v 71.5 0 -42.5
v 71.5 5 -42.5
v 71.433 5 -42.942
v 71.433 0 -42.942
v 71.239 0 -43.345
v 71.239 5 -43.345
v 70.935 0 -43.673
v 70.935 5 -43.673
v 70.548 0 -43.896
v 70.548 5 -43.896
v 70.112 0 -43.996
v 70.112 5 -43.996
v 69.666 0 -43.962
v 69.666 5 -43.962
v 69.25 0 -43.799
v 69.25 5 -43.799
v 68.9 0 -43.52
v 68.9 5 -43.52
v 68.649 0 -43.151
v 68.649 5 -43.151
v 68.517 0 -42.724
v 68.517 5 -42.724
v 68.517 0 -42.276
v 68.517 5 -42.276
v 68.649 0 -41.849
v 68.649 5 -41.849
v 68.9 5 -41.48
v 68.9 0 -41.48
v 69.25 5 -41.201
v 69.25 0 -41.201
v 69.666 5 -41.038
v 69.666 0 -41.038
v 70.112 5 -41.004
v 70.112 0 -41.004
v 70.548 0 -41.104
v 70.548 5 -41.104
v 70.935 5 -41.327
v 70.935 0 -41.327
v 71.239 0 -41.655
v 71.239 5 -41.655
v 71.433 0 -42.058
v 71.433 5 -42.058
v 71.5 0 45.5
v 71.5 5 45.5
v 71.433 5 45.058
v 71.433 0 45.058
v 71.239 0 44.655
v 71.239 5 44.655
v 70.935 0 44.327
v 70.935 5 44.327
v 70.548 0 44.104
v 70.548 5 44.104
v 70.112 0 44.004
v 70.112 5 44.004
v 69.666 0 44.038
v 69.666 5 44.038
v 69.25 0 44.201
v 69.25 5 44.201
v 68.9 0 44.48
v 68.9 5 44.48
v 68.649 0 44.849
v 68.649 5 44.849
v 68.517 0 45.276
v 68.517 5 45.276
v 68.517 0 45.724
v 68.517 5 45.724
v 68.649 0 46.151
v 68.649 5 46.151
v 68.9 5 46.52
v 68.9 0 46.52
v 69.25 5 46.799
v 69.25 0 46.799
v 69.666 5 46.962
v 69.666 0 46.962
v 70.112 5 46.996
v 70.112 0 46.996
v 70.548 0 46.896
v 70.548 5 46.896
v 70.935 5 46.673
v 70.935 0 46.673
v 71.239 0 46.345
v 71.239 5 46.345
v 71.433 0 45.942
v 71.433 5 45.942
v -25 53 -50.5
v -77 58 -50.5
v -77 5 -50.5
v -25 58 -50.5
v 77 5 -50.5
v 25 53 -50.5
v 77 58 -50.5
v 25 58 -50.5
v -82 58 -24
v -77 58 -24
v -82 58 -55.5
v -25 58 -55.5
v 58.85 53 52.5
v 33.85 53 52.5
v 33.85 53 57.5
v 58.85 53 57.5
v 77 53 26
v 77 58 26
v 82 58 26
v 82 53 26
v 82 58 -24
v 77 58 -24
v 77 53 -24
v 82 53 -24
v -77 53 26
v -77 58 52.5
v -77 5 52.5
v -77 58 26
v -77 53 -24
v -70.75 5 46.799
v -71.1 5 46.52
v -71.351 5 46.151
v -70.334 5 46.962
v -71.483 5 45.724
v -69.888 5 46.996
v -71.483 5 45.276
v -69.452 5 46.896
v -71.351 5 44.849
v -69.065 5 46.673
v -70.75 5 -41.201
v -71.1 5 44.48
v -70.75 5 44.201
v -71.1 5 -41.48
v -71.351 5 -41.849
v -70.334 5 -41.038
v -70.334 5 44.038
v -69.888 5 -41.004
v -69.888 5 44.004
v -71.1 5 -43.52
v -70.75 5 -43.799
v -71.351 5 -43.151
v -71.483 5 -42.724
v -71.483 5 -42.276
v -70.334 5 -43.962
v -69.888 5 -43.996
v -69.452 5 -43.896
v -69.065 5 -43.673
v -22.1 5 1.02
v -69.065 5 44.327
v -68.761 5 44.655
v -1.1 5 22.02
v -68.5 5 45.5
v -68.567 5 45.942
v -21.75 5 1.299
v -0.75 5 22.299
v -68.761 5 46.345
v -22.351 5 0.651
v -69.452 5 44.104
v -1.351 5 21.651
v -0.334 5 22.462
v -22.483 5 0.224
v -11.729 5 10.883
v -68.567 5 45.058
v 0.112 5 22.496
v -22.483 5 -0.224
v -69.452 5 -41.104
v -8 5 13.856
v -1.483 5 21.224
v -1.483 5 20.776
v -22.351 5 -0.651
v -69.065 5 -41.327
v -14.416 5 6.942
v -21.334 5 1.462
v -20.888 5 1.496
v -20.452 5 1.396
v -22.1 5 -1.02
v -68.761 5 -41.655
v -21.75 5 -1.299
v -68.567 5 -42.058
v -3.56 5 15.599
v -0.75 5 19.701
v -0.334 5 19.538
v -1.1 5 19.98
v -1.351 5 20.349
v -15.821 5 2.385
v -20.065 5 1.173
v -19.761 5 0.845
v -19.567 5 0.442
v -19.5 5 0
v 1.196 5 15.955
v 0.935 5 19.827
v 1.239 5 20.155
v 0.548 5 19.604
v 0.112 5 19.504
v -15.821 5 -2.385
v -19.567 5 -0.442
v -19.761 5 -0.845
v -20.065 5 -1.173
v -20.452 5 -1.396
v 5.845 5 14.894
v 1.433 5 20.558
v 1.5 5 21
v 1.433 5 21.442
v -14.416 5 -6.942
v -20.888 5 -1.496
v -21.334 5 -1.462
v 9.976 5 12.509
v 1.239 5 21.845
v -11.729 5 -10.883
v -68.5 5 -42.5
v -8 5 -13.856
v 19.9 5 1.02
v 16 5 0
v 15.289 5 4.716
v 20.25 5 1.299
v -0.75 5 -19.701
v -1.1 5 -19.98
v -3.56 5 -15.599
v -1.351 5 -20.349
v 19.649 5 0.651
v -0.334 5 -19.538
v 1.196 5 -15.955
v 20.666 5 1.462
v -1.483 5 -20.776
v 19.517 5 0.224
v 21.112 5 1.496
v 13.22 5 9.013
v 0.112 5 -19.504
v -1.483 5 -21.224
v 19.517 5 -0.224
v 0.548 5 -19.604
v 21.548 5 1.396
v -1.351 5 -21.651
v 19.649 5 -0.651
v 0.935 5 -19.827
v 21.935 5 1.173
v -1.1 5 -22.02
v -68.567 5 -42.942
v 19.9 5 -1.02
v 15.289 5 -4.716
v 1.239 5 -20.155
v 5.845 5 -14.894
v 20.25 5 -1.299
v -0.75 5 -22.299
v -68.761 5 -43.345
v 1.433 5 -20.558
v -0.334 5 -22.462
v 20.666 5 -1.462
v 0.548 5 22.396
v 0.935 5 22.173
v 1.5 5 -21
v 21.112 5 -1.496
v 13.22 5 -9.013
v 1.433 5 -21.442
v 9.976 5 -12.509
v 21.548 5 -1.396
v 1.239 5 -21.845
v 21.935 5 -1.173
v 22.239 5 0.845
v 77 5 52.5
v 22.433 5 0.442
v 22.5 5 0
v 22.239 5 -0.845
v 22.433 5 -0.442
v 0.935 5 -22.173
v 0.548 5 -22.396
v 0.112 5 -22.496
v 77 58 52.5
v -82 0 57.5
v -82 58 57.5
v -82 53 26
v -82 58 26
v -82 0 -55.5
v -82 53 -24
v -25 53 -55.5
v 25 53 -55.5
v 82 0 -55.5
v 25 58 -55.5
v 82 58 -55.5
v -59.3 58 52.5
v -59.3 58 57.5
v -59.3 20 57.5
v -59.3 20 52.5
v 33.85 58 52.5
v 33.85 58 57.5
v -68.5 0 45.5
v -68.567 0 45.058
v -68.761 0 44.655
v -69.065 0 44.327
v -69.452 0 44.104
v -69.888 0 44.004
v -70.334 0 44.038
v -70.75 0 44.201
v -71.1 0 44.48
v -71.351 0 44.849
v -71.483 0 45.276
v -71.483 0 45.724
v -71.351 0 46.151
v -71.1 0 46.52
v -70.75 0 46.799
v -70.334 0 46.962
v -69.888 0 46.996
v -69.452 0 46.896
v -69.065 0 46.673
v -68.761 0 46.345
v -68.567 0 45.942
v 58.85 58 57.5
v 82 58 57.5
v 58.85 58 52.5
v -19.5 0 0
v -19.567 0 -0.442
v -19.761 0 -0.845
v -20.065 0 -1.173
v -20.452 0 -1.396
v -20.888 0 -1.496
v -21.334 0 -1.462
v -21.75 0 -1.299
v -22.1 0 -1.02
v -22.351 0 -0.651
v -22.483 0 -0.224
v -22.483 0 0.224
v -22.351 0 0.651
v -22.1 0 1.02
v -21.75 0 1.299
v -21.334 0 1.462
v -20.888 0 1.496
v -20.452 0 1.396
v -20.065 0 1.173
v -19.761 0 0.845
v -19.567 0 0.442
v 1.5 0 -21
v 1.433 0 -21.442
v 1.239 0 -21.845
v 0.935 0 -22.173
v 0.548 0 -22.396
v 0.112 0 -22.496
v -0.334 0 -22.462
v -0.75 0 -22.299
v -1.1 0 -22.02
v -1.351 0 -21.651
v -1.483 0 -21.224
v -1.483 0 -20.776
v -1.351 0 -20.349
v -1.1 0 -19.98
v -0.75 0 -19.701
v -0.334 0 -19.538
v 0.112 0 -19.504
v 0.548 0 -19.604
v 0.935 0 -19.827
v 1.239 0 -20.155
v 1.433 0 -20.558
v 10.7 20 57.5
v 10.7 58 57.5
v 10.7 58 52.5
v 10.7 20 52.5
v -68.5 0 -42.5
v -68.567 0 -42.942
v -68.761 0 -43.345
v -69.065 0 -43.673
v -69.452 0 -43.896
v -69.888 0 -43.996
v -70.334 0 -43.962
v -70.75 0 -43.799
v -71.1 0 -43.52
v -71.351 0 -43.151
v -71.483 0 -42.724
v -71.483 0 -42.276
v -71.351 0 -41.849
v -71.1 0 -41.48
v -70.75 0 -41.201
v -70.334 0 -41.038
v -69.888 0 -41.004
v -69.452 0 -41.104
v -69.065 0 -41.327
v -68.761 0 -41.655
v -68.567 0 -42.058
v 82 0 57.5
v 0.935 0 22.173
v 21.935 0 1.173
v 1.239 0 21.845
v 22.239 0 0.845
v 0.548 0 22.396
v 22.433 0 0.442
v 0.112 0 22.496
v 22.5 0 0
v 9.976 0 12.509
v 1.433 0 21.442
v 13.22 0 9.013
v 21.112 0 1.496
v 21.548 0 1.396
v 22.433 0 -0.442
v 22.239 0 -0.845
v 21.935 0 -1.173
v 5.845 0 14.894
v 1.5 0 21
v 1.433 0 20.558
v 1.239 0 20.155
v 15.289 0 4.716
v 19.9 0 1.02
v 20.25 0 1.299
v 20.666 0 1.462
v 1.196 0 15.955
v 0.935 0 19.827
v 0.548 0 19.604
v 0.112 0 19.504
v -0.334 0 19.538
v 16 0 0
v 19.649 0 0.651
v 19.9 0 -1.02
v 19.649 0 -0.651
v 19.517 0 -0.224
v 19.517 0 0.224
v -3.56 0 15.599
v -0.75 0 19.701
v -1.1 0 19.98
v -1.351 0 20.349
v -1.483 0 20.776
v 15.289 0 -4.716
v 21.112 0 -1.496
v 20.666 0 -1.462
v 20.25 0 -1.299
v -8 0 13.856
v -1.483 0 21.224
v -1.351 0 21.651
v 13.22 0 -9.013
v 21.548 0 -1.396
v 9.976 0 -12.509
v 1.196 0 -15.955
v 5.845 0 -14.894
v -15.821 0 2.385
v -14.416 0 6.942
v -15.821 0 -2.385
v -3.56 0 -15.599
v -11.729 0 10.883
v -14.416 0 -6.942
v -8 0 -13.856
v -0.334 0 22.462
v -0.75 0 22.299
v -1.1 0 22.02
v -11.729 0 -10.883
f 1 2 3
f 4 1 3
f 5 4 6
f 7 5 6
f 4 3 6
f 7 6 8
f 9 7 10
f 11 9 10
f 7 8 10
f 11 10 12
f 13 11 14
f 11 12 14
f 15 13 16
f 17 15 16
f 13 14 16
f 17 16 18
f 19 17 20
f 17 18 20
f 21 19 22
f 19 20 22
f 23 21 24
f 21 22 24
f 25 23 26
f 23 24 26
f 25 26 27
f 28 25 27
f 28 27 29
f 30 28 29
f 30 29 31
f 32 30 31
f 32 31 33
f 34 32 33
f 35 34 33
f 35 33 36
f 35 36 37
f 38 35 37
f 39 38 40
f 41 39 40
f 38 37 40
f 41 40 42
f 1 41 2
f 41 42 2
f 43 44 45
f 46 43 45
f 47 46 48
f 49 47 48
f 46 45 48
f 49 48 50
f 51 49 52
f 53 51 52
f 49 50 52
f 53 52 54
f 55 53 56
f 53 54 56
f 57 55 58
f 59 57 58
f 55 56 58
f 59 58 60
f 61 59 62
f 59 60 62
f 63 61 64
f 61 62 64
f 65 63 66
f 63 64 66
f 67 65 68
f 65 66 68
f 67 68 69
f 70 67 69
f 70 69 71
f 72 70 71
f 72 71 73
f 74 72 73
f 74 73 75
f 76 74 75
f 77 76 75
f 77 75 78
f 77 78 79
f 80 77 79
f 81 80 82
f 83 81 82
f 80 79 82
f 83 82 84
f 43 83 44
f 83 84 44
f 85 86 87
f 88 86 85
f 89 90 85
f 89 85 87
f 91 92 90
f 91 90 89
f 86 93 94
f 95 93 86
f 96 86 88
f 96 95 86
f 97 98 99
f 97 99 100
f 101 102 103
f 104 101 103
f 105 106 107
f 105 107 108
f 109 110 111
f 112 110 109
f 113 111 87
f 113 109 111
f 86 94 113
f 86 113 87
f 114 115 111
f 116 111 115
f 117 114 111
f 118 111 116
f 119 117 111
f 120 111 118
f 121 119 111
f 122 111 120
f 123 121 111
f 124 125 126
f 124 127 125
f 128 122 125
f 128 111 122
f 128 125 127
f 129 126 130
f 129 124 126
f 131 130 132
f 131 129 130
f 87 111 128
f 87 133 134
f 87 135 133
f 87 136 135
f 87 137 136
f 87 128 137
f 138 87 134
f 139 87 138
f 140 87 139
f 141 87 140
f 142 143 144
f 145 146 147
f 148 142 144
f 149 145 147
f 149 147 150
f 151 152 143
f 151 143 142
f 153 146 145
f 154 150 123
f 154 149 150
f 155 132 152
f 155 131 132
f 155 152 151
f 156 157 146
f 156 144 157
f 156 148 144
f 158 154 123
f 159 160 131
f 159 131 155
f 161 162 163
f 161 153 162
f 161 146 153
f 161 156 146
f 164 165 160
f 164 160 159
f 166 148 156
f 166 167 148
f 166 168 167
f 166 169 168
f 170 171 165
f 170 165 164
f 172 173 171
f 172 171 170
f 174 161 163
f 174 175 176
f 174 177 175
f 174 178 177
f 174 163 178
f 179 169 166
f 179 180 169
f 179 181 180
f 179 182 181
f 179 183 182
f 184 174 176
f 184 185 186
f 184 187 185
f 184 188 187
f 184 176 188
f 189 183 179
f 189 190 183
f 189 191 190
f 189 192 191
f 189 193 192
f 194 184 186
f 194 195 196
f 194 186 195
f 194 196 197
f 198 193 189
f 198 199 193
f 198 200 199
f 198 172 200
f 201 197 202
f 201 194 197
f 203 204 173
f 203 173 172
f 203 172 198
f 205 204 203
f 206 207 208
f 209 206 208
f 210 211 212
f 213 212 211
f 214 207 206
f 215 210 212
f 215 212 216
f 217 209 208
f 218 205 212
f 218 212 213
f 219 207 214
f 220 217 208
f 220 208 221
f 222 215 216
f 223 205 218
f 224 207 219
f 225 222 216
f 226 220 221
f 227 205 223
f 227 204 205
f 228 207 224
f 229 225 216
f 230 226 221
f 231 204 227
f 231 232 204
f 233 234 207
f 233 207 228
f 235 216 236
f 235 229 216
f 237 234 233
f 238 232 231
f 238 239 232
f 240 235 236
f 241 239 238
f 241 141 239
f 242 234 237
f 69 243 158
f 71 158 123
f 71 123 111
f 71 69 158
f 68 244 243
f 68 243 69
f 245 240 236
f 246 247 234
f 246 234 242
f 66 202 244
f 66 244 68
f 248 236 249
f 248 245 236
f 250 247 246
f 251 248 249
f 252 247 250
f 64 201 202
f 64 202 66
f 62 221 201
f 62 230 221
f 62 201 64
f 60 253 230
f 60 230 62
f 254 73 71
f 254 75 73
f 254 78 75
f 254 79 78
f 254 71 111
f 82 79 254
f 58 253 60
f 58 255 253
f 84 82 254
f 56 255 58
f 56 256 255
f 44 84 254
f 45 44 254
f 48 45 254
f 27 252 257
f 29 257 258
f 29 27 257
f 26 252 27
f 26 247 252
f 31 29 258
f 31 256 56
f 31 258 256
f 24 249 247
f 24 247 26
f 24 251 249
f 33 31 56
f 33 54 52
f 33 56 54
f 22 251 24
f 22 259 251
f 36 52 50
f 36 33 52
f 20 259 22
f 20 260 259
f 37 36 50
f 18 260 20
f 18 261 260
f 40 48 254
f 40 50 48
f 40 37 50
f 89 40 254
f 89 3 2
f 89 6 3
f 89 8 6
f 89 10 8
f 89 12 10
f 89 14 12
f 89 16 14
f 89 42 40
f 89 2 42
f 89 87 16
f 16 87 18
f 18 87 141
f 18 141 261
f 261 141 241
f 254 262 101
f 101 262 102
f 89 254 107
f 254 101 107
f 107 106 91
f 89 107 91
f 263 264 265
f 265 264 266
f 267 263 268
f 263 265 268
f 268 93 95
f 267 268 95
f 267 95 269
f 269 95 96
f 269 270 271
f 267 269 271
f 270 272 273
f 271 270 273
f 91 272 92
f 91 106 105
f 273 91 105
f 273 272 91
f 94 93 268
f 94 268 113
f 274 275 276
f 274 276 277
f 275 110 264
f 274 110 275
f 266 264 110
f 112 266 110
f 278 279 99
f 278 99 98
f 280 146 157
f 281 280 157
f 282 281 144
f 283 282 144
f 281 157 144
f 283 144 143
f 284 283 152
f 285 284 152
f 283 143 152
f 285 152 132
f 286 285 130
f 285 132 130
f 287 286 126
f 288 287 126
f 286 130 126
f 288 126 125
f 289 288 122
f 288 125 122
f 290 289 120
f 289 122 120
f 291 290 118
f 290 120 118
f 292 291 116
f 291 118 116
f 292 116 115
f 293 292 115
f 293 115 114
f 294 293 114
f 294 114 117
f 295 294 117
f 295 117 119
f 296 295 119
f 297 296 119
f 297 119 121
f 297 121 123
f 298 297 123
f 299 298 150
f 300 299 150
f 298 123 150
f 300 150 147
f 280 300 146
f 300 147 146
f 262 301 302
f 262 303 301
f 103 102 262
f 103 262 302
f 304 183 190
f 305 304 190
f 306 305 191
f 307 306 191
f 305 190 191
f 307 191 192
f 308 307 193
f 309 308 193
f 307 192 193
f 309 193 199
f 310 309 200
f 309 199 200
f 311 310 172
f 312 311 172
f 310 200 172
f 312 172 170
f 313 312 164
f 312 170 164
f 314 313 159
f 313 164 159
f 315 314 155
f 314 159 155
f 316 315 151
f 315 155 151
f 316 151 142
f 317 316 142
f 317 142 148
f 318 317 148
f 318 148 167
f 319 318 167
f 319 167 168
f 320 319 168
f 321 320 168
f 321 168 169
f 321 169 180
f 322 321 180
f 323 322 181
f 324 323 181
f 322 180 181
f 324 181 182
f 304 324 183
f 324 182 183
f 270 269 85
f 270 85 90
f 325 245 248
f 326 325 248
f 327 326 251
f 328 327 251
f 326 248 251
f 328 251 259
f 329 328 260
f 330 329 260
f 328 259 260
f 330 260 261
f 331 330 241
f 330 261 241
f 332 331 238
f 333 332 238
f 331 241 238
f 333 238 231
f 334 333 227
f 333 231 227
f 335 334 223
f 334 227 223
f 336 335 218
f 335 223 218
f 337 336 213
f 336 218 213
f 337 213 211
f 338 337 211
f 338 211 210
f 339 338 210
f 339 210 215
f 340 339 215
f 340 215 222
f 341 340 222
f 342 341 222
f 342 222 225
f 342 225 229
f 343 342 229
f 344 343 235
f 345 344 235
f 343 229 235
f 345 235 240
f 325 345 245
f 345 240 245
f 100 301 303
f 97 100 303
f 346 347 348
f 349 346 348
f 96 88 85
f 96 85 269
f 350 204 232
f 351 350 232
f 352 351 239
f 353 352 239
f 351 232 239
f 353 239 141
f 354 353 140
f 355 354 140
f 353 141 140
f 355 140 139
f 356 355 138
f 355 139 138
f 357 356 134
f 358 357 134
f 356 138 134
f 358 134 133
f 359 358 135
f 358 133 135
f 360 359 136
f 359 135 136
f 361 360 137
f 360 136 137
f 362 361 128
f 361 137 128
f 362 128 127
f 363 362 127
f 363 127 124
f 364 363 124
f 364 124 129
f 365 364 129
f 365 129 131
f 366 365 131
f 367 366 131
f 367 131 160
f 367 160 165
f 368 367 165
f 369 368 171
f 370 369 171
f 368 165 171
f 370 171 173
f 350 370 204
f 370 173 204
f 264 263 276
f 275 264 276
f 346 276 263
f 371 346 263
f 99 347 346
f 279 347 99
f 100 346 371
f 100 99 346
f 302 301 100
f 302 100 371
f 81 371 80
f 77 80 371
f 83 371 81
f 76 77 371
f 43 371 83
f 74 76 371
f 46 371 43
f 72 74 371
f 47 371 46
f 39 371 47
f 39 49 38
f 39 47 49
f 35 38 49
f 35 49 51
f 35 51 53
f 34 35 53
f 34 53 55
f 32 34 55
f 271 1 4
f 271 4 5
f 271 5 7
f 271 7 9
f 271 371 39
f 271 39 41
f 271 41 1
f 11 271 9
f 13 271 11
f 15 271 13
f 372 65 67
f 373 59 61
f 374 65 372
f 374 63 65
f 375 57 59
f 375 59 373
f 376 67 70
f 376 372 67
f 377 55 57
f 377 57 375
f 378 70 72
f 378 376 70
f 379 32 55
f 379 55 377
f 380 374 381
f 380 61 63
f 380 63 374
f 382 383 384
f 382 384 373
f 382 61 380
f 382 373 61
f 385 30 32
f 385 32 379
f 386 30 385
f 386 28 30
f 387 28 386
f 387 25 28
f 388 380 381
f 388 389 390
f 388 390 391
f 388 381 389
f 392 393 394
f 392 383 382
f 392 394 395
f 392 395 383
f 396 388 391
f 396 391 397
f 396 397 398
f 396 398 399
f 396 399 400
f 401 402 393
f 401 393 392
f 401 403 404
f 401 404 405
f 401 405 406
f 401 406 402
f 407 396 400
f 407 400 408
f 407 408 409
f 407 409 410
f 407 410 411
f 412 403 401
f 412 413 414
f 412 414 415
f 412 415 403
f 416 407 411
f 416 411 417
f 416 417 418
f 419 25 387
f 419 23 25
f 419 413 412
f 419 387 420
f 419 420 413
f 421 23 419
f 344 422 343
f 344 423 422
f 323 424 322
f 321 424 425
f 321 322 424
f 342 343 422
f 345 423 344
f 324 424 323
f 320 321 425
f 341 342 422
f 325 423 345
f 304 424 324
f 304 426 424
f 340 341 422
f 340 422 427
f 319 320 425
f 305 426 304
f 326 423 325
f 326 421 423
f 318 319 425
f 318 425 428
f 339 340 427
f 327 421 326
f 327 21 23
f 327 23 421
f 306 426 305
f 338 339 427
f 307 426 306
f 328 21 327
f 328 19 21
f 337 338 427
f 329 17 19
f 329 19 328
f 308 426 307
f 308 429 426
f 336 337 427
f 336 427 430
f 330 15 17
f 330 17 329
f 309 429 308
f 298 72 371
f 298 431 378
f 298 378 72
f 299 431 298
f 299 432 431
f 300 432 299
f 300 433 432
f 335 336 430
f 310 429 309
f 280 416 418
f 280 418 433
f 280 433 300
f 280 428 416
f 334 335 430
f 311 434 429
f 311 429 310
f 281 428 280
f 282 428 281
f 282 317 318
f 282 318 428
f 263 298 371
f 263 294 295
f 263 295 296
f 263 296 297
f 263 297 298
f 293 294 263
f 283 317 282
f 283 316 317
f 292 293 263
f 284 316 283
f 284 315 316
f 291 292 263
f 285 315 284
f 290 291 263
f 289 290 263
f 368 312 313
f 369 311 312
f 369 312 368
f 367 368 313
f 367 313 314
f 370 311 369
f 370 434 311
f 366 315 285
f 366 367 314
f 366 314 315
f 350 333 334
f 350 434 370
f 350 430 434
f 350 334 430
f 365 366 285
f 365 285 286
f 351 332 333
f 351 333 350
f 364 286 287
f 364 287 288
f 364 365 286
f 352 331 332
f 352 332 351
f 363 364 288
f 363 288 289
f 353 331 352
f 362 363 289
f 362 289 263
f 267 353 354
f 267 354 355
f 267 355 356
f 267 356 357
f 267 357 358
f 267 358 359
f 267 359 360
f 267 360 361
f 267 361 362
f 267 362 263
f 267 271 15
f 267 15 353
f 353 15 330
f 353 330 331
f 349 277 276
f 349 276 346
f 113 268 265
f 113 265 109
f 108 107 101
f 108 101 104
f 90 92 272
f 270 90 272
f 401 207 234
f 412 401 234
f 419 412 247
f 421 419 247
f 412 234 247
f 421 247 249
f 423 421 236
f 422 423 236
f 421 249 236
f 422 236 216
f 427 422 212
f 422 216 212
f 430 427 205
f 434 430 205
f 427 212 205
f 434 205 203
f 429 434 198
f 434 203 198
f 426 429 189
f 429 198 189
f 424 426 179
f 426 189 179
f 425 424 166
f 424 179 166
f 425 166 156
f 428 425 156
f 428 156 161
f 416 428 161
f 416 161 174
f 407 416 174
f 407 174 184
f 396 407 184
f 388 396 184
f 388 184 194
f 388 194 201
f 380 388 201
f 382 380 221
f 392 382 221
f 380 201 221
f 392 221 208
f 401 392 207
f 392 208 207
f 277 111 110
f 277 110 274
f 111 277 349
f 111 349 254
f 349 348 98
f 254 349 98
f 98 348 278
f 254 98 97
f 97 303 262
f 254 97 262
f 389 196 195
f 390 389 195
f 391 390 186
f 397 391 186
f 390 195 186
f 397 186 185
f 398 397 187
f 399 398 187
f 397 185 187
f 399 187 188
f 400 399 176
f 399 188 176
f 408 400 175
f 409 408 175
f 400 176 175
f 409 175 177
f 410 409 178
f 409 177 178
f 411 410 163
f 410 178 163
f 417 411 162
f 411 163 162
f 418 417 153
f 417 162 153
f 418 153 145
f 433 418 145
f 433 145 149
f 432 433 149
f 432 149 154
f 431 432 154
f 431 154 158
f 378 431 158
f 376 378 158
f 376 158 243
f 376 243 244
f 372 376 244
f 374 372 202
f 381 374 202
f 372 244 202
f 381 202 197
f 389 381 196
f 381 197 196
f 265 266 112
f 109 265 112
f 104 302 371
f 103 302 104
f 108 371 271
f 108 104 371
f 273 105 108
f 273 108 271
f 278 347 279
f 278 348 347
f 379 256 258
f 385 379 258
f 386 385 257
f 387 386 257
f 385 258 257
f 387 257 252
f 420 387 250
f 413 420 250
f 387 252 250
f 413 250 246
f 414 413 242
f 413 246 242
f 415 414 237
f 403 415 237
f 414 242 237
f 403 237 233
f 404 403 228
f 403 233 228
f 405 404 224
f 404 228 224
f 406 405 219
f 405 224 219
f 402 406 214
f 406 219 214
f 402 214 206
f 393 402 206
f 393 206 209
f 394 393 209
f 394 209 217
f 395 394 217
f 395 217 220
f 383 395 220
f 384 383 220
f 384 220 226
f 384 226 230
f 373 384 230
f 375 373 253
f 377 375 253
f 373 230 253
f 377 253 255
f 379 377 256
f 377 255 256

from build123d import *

# Parameters (mm, degrees)
ESQUISSE1_W             = 154
ESQUISSE1_H             = 101
BOSS_EXTRU_1_DEPTH      = 5
ESQUISSE2_R             = 16
ESQUISSE2_R_2           = 1.5
ENL_V_MAT_EXTRU_2_DEPTH = 5
ESQUISSE3_R             = 1.5
ENL_V_MAT_EXTRU_3_DEPTH = 5
ESQUISSE8_W             = 164
ESQUISSE8_H             = 113
ESQUISSE8_W_2           = 154
ESQUISSE8_H_2           = 103
BOSS_EXTRU_3_DEPTH      = 53
BOSS_EXTRU_3_DEPTH_BACK = 5
ESQUISSE9_W             = 154
ESQUISSE9_H             = 2
BOSS_EXTRU_4_DEPTH      = 5
ESQUISSE11_W            = 70
ESQUISSE11_H            = 5
ENL_V_MAT_EXTRU_7_DEPTH = 38
ESQUISSE12_W            = 50
ESQUISSE12_H            = 5
ESQUISSE12_W_2          = 5
ESQUISSE12_H_2          = 50
ENL_V_MAT_EXTRU_8_DEPTH = 5
ESQUISSE13_W            = 25
ESQUISSE13_H            = 5
ENL_V_MAT_EXTRU_9_DEPTH = 5


with BuildPart() as part:
    # Esquisse1 → Boss.-Extru.1 (new body)
    with BuildSketch(Plane(origin=(0, 0, 0), x_dir=(1, 0, 0), z_dir=(0, 1, 0))):
        Rectangle(ESQUISSE1_W, ESQUISSE1_H)
    extrude(amount=BOSS_EXTRU_1_DEPTH)

    # Esquisse2 → Enlèv. mat.-Extru.2 (cut)
    with BuildSketch(Plane(origin=(0, 5, 0), x_dir=(1, 0, 0), z_dir=(0, 1, 0))):
        Circle(ESQUISSE2_R)
        with Locations((0, 21)):
            Circle(ESQUISSE2_R_2)
        with Locations((-21, 0)):
            Circle(ESQUISSE2_R_2)
        with Locations((21, 0)):
            Circle(ESQUISSE2_R_2)
        with Locations((0, -21)):
            Circle(ESQUISSE2_R_2)
    extrude(amount=-ENL_V_MAT_EXTRU_2_DEPTH, mode=Mode.SUBTRACT)

    # Esquisse3 → Enlèv. mat.-Extru.3 (cut)
    with BuildSketch(Plane(origin=(0, 5, 0), x_dir=(1, 0, 0), z_dir=(0, 1, 0))):
        with Locations((70, -45.5)):
            Circle(ESQUISSE3_R)
        with Locations((-70, -45.5)):
            Circle(ESQUISSE3_R)
        with Locations((-70, 42.5)):
            Circle(ESQUISSE3_R)
        with Locations((70, 42.5)):
            Circle(ESQUISSE3_R)
    extrude(amount=-ENL_V_MAT_EXTRU_3_DEPTH, mode=Mode.SUBTRACT)



with BuildPart() as body_2:
    # Esquisse8 → Boss.-Extru.3 (new body, two sides)
    with BuildSketch(Plane(origin=(0, 5, 0), x_dir=(1, 0, 0), z_dir=(0, 1, 0))) as boss_extru_3_sk:
        with Locations((0, -1)):
            Rectangle(ESQUISSE8_W, ESQUISSE8_H)
        with Locations((0, -1)):
            Rectangle(ESQUISSE8_W_2, ESQUISSE8_H_2, mode=Mode.SUBTRACT)
    extrude(amount=BOSS_EXTRU_3_DEPTH)
    extrude(boss_extru_3_sk.sketch, amount=-BOSS_EXTRU_3_DEPTH_BACK)


with BuildPart() as part_1:
    add(part.part)

    add(body_2.part)  # Boss.-Extru.4 merges body 2
    # Esquisse9 → Boss.-Extru.4 (add)
    with BuildSketch(Plane(origin=(0, 0, 0), x_dir=(-1, 0, 0), z_dir=(0, -1, 0))):
        with Locations((0, -51.5)):
            Rectangle(ESQUISSE9_W, ESQUISSE9_H)
    extrude(amount=-BOSS_EXTRU_4_DEPTH)

    # Esquisse11 → Enlèv. mat.-Extru.7 (cut)
    with BuildSketch(Plane(origin=(0, 58, 0), x_dir=(1, 0, 0), z_dir=(0, 1, 0))):
        with Locations((-24.3, -55)):
            Rectangle(ESQUISSE11_W, ESQUISSE11_H)
    extrude(amount=-ENL_V_MAT_EXTRU_7_DEPTH, mode=Mode.SUBTRACT)

    # Esquisse12 → Enlèv. mat.-Extru.8 (cut)
    with BuildSketch(Plane(origin=(0, 58, 0), x_dir=(1, 0, 0), z_dir=(0, 1, 0))):
        with Locations((0, 53)):
            Rectangle(ESQUISSE12_W, ESQUISSE12_H)
        with Locations((79.5, -1)):
            Rectangle(ESQUISSE12_W_2, ESQUISSE12_H_2)
        with Locations((-79.5, -1)):
            Rectangle(ESQUISSE12_W_2, ESQUISSE12_H_2)
    extrude(amount=-ENL_V_MAT_EXTRU_8_DEPTH, mode=Mode.SUBTRACT)

    # Esquisse13 → Enlèv. mat.-Extru.9 (cut)
    with BuildSketch(Plane(origin=(0, 58, 0), x_dir=(1, 0, 0), z_dir=(0, 1, 0))):
        with Locations((46.35, -55)):
            Rectangle(ESQUISSE13_W, ESQUISSE13_H)
    extrude(amount=-ENL_V_MAT_EXTRU_9_DEPTH, mode=Mode.SUBTRACT)


solid = part_1.part
